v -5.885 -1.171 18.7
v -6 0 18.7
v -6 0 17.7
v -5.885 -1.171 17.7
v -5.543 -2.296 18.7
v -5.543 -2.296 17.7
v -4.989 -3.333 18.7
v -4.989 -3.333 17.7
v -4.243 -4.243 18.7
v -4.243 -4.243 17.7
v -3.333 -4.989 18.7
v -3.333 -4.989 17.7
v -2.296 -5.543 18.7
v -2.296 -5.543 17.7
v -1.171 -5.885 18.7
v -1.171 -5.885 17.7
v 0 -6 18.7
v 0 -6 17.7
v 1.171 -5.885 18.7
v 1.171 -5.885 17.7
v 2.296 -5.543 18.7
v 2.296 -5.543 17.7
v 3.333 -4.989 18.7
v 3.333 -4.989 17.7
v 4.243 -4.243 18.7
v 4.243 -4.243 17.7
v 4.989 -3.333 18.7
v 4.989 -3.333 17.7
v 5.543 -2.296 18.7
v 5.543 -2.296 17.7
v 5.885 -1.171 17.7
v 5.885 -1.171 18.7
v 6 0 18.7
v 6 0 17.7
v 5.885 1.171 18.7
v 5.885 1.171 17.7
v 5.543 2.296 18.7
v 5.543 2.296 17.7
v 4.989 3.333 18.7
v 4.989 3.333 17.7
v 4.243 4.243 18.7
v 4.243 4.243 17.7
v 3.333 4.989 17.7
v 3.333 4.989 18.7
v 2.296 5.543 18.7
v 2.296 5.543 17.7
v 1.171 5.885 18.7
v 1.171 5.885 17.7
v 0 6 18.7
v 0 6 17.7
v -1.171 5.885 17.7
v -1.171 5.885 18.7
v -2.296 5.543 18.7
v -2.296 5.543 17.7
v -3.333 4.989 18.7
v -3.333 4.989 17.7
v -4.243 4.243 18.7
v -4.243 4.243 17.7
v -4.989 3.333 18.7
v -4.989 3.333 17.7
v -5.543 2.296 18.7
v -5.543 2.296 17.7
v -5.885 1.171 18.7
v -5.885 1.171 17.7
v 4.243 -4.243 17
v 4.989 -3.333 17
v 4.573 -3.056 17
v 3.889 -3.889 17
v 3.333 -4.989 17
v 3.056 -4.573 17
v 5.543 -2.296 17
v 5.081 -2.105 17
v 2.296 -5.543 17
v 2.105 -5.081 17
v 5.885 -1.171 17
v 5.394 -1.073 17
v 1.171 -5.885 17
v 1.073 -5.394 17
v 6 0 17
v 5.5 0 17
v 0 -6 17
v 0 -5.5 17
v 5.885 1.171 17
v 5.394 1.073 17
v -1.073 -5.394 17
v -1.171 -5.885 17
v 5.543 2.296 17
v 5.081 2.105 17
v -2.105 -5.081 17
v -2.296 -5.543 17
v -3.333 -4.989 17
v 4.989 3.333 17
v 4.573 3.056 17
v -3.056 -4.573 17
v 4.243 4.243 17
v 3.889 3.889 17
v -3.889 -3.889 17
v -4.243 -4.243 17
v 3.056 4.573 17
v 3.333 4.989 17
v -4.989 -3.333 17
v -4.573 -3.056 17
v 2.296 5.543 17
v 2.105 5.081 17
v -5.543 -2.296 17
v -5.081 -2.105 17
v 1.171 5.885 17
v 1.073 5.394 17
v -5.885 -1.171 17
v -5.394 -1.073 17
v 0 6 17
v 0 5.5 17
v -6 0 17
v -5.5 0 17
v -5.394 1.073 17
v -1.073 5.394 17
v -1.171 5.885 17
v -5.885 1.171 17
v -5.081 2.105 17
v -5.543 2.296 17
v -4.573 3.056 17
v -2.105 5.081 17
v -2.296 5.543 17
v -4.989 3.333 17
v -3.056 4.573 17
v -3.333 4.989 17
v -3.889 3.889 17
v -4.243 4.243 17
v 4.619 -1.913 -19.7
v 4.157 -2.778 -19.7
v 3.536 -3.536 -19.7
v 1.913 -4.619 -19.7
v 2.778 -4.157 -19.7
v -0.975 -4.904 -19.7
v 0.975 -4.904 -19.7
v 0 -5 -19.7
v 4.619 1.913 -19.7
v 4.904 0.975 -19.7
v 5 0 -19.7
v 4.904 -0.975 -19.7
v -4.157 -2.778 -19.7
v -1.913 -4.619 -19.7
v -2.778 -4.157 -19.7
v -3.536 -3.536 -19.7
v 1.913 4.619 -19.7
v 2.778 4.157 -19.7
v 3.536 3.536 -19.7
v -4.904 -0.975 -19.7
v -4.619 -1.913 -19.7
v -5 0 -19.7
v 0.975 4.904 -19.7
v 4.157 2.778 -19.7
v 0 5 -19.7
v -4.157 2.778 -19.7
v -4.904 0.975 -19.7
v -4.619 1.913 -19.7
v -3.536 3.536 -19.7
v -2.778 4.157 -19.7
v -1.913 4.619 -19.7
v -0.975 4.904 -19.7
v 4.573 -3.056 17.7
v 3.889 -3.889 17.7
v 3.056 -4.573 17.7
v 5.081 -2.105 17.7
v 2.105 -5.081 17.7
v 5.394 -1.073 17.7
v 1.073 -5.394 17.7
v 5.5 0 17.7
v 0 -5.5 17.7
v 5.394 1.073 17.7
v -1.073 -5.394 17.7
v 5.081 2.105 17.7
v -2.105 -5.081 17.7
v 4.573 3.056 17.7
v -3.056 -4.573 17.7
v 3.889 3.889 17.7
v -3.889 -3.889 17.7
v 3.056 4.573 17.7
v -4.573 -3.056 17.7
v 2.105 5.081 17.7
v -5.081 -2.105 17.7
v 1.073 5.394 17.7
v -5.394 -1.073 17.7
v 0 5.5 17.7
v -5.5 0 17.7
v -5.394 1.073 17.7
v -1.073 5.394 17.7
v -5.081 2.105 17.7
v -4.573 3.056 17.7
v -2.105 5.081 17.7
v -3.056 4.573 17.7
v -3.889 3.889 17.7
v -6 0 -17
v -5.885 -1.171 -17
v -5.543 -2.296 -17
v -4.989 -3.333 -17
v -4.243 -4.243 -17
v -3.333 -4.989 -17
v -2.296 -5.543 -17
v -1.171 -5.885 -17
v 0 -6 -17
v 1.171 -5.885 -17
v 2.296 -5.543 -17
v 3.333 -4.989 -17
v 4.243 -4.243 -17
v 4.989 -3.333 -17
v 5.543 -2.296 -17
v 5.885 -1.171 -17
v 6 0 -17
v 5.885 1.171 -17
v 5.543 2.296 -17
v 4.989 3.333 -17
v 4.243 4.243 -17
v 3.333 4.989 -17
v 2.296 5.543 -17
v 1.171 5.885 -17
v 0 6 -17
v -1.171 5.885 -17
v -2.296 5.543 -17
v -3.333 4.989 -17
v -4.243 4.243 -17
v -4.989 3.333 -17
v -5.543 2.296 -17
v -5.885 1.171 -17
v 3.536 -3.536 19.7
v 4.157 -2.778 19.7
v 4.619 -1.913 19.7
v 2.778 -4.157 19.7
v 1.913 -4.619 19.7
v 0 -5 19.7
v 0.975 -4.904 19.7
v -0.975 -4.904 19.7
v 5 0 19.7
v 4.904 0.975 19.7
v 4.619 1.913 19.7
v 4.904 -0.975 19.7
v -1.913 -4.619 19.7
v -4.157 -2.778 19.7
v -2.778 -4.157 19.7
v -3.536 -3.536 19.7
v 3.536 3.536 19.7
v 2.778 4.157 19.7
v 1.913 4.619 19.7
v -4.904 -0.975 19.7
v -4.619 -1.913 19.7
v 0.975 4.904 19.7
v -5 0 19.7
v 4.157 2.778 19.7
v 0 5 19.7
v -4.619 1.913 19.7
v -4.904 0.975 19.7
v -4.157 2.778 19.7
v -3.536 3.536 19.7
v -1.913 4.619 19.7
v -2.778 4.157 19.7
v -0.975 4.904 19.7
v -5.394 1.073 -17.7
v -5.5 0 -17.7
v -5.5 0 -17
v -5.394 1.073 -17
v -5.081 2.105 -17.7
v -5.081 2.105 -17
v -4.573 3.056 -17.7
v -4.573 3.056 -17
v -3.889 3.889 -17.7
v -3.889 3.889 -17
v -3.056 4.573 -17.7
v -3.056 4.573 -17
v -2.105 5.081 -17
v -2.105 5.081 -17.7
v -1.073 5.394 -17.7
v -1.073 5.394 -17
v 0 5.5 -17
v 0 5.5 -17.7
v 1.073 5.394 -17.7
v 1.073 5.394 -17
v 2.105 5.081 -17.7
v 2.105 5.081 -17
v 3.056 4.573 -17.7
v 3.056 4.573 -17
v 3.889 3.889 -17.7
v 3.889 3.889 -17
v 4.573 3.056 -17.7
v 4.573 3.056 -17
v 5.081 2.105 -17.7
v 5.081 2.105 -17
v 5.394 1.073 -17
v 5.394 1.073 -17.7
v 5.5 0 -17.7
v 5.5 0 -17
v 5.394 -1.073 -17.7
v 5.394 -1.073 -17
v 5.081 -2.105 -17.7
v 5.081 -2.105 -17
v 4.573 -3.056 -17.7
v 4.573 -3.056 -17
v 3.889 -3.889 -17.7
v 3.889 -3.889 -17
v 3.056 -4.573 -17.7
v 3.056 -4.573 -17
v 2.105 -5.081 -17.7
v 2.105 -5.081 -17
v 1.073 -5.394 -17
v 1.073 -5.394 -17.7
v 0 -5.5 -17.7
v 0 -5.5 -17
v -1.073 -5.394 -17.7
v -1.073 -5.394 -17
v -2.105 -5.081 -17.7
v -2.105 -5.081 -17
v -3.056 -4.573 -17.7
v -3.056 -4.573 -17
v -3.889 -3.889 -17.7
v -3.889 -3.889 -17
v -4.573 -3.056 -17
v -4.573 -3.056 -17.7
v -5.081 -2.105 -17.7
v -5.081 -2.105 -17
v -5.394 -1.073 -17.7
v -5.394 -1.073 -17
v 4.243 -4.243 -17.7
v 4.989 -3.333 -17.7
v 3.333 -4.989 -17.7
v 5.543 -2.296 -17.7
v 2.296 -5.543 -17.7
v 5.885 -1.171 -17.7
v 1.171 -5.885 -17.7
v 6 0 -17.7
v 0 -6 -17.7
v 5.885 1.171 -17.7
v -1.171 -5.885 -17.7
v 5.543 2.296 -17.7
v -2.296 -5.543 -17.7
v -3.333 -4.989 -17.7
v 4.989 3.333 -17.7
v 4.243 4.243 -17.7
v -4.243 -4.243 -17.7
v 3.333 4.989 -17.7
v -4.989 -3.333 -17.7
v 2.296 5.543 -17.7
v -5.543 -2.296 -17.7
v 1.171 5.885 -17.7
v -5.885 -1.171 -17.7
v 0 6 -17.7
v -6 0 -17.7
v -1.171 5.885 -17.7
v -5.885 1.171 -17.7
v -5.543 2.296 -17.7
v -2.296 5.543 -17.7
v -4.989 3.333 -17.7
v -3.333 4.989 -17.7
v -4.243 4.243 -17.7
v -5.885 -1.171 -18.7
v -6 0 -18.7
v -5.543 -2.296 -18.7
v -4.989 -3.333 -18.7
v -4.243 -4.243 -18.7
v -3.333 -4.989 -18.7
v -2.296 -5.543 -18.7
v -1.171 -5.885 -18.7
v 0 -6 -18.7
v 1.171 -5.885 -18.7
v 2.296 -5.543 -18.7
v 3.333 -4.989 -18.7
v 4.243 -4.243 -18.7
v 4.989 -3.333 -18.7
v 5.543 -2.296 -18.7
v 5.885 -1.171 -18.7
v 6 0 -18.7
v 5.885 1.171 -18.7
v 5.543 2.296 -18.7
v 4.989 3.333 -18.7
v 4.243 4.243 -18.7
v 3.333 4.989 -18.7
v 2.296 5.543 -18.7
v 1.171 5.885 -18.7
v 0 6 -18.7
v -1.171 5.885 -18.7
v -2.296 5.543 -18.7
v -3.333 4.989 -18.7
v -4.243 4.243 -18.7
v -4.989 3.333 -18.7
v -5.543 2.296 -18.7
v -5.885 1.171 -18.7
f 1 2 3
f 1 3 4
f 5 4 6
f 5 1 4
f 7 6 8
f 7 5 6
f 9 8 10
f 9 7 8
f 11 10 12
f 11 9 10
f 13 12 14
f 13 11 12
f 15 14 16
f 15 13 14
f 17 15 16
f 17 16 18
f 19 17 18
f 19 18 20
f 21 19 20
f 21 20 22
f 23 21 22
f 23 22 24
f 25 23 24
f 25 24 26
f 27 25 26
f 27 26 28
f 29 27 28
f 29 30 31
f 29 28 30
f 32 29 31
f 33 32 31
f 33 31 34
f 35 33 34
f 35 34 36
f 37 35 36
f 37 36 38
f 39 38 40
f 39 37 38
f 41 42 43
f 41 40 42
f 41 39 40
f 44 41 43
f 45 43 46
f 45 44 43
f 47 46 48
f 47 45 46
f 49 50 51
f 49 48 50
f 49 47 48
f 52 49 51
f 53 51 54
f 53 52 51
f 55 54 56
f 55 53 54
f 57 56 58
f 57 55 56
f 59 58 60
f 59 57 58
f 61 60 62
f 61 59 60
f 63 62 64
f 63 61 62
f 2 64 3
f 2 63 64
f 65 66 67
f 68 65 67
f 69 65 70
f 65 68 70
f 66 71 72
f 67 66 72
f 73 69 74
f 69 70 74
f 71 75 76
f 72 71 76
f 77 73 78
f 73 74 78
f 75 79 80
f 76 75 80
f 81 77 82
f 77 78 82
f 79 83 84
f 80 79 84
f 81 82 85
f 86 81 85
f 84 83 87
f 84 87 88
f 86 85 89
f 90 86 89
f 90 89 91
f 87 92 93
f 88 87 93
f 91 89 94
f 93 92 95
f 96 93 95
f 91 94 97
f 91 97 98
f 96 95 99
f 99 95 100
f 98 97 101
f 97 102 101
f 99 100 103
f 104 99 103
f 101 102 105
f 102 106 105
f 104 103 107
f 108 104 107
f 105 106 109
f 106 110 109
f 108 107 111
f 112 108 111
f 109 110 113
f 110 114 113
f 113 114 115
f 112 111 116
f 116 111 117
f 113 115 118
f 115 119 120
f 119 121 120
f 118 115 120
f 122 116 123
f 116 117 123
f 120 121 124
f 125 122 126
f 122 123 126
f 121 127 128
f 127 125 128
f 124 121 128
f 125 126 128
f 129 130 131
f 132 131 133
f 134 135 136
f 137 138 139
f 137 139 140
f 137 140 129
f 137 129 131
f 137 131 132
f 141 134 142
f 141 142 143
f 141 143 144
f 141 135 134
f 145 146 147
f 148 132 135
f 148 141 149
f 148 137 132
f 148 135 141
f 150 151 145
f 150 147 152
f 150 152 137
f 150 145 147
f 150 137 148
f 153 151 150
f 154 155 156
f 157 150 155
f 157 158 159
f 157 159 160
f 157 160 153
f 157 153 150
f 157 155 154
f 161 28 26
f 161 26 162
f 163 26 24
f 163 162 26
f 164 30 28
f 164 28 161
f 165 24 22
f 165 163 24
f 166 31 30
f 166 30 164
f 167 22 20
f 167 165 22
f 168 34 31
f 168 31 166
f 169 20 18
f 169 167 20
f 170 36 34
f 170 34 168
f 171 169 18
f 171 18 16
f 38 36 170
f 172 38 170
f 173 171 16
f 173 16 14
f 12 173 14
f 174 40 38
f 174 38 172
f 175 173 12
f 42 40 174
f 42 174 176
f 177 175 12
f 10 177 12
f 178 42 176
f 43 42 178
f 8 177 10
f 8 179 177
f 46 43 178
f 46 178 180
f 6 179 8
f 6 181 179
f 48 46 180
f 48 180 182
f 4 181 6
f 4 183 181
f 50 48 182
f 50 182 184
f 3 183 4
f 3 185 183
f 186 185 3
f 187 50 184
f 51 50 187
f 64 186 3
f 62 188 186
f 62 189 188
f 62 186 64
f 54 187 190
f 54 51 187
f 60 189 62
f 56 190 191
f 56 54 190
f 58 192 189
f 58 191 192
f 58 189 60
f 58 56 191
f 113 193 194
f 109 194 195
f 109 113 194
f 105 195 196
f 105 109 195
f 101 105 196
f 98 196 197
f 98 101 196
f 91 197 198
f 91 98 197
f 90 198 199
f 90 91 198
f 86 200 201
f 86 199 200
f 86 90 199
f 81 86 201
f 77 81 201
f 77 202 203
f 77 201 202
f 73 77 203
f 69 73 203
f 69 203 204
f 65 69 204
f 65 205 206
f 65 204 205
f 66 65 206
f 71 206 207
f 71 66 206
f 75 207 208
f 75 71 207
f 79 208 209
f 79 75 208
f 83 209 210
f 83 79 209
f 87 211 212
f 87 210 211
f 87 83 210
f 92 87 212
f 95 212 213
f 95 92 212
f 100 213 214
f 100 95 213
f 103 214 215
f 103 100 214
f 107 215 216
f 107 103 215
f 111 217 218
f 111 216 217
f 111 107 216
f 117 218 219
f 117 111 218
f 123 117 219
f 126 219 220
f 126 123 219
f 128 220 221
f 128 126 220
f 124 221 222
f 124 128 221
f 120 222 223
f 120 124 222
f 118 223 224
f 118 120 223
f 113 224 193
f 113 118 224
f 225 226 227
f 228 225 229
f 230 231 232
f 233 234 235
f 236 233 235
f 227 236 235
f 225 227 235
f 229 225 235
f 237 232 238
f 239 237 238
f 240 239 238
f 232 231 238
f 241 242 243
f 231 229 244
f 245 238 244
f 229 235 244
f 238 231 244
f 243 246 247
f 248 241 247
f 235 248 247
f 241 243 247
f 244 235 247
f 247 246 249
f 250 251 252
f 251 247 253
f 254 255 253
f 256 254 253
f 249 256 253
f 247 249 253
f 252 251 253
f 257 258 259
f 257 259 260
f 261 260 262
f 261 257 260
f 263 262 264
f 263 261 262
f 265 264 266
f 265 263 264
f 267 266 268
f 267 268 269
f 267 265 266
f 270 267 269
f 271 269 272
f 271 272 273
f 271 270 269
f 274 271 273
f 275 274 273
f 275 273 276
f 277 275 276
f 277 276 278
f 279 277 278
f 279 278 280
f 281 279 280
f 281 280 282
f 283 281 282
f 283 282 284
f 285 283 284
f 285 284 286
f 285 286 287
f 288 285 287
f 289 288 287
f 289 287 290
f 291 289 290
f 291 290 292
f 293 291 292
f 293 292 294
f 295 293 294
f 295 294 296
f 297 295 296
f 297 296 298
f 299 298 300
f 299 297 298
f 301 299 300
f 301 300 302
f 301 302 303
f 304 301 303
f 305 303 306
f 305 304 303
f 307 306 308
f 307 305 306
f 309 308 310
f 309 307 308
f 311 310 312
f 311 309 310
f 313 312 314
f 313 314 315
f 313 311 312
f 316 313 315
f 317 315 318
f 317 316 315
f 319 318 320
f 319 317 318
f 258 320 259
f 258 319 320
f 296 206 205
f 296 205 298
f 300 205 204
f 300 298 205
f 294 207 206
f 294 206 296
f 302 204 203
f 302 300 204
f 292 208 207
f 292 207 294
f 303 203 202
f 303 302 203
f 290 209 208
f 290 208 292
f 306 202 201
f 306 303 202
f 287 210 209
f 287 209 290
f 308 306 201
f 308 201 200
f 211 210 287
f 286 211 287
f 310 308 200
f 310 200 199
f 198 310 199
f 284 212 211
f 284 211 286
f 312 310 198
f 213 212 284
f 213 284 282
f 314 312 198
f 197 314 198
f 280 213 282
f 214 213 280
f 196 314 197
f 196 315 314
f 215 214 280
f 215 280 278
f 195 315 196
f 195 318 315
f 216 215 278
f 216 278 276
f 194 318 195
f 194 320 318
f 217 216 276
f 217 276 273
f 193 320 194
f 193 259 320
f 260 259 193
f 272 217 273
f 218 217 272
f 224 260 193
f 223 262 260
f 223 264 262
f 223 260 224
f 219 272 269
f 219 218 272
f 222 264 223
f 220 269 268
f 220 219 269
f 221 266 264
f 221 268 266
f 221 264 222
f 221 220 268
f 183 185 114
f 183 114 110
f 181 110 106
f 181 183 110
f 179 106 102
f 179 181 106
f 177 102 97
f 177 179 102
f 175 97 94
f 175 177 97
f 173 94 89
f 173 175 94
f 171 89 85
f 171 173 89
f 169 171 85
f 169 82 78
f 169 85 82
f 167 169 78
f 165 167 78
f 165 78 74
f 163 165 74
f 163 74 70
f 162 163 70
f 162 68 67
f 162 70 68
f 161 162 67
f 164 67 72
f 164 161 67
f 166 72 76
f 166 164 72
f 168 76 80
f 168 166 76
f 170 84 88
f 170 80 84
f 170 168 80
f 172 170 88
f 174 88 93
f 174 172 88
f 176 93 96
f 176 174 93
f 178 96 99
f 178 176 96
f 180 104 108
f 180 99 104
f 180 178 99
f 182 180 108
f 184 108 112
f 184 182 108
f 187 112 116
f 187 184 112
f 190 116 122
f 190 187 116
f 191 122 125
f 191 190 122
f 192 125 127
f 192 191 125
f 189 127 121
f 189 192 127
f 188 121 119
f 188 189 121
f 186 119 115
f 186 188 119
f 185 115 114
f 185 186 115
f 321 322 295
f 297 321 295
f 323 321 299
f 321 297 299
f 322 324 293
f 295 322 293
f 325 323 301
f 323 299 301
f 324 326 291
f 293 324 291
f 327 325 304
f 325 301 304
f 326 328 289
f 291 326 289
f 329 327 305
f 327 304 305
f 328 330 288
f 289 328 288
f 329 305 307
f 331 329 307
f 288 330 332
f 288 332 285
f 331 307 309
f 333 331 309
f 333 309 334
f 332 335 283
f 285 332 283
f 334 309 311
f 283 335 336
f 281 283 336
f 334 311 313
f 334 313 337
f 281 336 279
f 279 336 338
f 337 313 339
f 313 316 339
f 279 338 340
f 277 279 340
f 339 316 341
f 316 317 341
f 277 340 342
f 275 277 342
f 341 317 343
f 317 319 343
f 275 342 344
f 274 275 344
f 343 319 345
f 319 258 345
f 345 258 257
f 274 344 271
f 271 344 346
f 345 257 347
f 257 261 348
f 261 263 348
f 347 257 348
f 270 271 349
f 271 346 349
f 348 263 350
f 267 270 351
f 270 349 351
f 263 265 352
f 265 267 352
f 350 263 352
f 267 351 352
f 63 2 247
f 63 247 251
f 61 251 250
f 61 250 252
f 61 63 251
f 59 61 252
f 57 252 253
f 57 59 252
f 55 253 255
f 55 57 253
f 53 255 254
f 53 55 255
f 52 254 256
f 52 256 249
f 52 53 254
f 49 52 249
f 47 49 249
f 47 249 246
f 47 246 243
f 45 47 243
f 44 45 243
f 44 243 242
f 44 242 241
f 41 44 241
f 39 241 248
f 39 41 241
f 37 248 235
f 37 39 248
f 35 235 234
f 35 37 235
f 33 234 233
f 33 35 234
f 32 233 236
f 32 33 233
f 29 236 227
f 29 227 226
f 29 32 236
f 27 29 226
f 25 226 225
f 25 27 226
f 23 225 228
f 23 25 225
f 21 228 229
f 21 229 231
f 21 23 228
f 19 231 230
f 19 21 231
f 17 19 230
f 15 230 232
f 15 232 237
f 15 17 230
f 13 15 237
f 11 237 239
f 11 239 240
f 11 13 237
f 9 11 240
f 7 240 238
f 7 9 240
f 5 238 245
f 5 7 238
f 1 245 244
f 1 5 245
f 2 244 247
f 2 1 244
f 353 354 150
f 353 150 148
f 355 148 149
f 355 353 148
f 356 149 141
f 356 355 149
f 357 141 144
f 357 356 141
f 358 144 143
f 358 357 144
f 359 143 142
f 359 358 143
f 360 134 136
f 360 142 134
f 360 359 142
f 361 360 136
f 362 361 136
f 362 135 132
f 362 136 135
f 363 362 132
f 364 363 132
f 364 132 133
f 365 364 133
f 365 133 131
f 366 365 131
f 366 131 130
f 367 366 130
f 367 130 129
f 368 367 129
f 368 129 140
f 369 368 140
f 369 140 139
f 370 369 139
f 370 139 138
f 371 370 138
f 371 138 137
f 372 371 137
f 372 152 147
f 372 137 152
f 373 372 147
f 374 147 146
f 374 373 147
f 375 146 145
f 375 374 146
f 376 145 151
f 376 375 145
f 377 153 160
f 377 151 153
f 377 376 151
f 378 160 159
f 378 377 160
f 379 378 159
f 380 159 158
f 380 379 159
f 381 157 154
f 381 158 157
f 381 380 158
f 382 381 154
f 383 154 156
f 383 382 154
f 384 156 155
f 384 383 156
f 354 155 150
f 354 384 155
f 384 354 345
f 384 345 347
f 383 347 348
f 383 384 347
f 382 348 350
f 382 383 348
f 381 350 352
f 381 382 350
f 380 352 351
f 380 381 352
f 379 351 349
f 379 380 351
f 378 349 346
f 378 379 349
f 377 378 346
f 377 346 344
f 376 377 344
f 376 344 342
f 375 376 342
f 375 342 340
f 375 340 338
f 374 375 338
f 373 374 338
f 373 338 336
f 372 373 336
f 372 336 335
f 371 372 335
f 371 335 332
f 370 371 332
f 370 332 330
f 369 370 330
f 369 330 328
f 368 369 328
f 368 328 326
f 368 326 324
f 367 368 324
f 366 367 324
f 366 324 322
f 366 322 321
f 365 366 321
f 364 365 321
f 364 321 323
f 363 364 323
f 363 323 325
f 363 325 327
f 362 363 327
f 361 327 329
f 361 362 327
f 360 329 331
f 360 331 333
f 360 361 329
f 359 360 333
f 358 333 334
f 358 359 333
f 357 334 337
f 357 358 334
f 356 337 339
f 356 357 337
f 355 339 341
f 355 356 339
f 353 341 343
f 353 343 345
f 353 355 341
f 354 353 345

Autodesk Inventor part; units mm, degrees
ref_plane "YZ Plane" through (0, 0, 0) normal (1, 0, 0) x (0, 1, 0)
ref_plane "XZ Plane" through (0, 0, 0) normal (0, 1, 0) x (-1, 0, 0)
ref_plane "XY Plane" through (0, 0, 0) normal (0, 0, 1) x (1, 0, 0)
sketch "Sketch1" plane through (0, 0, 0) normal (0, 1, 0) x (-1, 0, 0)
  line L0 (0, 0) -> (6, 0)
  line L1 (6, 0) -> (6, -17)
  line L2 (6, -17) -> (5.5, -17)
  line L3 (5.5, -17) -> (5.5, -17.7)
  line L4 (0, -19.7) -> (0, 0)
  line L5 (5.5, -17.7) -> (6, -17.7)
  line L6 (6, -17.7) -> (6, -18.7)
  line L7 (0, -19.7) -> (5, -19.7)
  line L8 (6, -18.7) -> (5, -19.7)
  line L9 (6, 0) -> (6, 17)
  line L10 (6, 17) -> (5.5, 17)
  line L11 (5.5, 17) -> (5.5, 17.7)
  line L12 (0, 19.7) -> (0, 0)
  line L13 (5.5, 17.7) -> (6, 17.7)
  line L14 (6, 17.7) -> (6, 18.7)
  line L15 (0, 19.7) -> (5, 19.7)
  line L16 (6, 18.7) -> (5, 19.7)
  point P0 (6, -19.7)
  dimension "d0" = 6
  dimension "d1" = 17
  dimension "d2" = 0.7
  dimension "d3" = 0.5
  dimension "d7" = 2
  dimension "d8" = 1
  dimension "d9" = 1
revolve "Revolution1" add sketch "Sketch1" angle 360 about axis through (0, 0, 19.7) along (0, 0, -1)
equation "\"d9\" = d8"
properties part number "Pin til stang"
